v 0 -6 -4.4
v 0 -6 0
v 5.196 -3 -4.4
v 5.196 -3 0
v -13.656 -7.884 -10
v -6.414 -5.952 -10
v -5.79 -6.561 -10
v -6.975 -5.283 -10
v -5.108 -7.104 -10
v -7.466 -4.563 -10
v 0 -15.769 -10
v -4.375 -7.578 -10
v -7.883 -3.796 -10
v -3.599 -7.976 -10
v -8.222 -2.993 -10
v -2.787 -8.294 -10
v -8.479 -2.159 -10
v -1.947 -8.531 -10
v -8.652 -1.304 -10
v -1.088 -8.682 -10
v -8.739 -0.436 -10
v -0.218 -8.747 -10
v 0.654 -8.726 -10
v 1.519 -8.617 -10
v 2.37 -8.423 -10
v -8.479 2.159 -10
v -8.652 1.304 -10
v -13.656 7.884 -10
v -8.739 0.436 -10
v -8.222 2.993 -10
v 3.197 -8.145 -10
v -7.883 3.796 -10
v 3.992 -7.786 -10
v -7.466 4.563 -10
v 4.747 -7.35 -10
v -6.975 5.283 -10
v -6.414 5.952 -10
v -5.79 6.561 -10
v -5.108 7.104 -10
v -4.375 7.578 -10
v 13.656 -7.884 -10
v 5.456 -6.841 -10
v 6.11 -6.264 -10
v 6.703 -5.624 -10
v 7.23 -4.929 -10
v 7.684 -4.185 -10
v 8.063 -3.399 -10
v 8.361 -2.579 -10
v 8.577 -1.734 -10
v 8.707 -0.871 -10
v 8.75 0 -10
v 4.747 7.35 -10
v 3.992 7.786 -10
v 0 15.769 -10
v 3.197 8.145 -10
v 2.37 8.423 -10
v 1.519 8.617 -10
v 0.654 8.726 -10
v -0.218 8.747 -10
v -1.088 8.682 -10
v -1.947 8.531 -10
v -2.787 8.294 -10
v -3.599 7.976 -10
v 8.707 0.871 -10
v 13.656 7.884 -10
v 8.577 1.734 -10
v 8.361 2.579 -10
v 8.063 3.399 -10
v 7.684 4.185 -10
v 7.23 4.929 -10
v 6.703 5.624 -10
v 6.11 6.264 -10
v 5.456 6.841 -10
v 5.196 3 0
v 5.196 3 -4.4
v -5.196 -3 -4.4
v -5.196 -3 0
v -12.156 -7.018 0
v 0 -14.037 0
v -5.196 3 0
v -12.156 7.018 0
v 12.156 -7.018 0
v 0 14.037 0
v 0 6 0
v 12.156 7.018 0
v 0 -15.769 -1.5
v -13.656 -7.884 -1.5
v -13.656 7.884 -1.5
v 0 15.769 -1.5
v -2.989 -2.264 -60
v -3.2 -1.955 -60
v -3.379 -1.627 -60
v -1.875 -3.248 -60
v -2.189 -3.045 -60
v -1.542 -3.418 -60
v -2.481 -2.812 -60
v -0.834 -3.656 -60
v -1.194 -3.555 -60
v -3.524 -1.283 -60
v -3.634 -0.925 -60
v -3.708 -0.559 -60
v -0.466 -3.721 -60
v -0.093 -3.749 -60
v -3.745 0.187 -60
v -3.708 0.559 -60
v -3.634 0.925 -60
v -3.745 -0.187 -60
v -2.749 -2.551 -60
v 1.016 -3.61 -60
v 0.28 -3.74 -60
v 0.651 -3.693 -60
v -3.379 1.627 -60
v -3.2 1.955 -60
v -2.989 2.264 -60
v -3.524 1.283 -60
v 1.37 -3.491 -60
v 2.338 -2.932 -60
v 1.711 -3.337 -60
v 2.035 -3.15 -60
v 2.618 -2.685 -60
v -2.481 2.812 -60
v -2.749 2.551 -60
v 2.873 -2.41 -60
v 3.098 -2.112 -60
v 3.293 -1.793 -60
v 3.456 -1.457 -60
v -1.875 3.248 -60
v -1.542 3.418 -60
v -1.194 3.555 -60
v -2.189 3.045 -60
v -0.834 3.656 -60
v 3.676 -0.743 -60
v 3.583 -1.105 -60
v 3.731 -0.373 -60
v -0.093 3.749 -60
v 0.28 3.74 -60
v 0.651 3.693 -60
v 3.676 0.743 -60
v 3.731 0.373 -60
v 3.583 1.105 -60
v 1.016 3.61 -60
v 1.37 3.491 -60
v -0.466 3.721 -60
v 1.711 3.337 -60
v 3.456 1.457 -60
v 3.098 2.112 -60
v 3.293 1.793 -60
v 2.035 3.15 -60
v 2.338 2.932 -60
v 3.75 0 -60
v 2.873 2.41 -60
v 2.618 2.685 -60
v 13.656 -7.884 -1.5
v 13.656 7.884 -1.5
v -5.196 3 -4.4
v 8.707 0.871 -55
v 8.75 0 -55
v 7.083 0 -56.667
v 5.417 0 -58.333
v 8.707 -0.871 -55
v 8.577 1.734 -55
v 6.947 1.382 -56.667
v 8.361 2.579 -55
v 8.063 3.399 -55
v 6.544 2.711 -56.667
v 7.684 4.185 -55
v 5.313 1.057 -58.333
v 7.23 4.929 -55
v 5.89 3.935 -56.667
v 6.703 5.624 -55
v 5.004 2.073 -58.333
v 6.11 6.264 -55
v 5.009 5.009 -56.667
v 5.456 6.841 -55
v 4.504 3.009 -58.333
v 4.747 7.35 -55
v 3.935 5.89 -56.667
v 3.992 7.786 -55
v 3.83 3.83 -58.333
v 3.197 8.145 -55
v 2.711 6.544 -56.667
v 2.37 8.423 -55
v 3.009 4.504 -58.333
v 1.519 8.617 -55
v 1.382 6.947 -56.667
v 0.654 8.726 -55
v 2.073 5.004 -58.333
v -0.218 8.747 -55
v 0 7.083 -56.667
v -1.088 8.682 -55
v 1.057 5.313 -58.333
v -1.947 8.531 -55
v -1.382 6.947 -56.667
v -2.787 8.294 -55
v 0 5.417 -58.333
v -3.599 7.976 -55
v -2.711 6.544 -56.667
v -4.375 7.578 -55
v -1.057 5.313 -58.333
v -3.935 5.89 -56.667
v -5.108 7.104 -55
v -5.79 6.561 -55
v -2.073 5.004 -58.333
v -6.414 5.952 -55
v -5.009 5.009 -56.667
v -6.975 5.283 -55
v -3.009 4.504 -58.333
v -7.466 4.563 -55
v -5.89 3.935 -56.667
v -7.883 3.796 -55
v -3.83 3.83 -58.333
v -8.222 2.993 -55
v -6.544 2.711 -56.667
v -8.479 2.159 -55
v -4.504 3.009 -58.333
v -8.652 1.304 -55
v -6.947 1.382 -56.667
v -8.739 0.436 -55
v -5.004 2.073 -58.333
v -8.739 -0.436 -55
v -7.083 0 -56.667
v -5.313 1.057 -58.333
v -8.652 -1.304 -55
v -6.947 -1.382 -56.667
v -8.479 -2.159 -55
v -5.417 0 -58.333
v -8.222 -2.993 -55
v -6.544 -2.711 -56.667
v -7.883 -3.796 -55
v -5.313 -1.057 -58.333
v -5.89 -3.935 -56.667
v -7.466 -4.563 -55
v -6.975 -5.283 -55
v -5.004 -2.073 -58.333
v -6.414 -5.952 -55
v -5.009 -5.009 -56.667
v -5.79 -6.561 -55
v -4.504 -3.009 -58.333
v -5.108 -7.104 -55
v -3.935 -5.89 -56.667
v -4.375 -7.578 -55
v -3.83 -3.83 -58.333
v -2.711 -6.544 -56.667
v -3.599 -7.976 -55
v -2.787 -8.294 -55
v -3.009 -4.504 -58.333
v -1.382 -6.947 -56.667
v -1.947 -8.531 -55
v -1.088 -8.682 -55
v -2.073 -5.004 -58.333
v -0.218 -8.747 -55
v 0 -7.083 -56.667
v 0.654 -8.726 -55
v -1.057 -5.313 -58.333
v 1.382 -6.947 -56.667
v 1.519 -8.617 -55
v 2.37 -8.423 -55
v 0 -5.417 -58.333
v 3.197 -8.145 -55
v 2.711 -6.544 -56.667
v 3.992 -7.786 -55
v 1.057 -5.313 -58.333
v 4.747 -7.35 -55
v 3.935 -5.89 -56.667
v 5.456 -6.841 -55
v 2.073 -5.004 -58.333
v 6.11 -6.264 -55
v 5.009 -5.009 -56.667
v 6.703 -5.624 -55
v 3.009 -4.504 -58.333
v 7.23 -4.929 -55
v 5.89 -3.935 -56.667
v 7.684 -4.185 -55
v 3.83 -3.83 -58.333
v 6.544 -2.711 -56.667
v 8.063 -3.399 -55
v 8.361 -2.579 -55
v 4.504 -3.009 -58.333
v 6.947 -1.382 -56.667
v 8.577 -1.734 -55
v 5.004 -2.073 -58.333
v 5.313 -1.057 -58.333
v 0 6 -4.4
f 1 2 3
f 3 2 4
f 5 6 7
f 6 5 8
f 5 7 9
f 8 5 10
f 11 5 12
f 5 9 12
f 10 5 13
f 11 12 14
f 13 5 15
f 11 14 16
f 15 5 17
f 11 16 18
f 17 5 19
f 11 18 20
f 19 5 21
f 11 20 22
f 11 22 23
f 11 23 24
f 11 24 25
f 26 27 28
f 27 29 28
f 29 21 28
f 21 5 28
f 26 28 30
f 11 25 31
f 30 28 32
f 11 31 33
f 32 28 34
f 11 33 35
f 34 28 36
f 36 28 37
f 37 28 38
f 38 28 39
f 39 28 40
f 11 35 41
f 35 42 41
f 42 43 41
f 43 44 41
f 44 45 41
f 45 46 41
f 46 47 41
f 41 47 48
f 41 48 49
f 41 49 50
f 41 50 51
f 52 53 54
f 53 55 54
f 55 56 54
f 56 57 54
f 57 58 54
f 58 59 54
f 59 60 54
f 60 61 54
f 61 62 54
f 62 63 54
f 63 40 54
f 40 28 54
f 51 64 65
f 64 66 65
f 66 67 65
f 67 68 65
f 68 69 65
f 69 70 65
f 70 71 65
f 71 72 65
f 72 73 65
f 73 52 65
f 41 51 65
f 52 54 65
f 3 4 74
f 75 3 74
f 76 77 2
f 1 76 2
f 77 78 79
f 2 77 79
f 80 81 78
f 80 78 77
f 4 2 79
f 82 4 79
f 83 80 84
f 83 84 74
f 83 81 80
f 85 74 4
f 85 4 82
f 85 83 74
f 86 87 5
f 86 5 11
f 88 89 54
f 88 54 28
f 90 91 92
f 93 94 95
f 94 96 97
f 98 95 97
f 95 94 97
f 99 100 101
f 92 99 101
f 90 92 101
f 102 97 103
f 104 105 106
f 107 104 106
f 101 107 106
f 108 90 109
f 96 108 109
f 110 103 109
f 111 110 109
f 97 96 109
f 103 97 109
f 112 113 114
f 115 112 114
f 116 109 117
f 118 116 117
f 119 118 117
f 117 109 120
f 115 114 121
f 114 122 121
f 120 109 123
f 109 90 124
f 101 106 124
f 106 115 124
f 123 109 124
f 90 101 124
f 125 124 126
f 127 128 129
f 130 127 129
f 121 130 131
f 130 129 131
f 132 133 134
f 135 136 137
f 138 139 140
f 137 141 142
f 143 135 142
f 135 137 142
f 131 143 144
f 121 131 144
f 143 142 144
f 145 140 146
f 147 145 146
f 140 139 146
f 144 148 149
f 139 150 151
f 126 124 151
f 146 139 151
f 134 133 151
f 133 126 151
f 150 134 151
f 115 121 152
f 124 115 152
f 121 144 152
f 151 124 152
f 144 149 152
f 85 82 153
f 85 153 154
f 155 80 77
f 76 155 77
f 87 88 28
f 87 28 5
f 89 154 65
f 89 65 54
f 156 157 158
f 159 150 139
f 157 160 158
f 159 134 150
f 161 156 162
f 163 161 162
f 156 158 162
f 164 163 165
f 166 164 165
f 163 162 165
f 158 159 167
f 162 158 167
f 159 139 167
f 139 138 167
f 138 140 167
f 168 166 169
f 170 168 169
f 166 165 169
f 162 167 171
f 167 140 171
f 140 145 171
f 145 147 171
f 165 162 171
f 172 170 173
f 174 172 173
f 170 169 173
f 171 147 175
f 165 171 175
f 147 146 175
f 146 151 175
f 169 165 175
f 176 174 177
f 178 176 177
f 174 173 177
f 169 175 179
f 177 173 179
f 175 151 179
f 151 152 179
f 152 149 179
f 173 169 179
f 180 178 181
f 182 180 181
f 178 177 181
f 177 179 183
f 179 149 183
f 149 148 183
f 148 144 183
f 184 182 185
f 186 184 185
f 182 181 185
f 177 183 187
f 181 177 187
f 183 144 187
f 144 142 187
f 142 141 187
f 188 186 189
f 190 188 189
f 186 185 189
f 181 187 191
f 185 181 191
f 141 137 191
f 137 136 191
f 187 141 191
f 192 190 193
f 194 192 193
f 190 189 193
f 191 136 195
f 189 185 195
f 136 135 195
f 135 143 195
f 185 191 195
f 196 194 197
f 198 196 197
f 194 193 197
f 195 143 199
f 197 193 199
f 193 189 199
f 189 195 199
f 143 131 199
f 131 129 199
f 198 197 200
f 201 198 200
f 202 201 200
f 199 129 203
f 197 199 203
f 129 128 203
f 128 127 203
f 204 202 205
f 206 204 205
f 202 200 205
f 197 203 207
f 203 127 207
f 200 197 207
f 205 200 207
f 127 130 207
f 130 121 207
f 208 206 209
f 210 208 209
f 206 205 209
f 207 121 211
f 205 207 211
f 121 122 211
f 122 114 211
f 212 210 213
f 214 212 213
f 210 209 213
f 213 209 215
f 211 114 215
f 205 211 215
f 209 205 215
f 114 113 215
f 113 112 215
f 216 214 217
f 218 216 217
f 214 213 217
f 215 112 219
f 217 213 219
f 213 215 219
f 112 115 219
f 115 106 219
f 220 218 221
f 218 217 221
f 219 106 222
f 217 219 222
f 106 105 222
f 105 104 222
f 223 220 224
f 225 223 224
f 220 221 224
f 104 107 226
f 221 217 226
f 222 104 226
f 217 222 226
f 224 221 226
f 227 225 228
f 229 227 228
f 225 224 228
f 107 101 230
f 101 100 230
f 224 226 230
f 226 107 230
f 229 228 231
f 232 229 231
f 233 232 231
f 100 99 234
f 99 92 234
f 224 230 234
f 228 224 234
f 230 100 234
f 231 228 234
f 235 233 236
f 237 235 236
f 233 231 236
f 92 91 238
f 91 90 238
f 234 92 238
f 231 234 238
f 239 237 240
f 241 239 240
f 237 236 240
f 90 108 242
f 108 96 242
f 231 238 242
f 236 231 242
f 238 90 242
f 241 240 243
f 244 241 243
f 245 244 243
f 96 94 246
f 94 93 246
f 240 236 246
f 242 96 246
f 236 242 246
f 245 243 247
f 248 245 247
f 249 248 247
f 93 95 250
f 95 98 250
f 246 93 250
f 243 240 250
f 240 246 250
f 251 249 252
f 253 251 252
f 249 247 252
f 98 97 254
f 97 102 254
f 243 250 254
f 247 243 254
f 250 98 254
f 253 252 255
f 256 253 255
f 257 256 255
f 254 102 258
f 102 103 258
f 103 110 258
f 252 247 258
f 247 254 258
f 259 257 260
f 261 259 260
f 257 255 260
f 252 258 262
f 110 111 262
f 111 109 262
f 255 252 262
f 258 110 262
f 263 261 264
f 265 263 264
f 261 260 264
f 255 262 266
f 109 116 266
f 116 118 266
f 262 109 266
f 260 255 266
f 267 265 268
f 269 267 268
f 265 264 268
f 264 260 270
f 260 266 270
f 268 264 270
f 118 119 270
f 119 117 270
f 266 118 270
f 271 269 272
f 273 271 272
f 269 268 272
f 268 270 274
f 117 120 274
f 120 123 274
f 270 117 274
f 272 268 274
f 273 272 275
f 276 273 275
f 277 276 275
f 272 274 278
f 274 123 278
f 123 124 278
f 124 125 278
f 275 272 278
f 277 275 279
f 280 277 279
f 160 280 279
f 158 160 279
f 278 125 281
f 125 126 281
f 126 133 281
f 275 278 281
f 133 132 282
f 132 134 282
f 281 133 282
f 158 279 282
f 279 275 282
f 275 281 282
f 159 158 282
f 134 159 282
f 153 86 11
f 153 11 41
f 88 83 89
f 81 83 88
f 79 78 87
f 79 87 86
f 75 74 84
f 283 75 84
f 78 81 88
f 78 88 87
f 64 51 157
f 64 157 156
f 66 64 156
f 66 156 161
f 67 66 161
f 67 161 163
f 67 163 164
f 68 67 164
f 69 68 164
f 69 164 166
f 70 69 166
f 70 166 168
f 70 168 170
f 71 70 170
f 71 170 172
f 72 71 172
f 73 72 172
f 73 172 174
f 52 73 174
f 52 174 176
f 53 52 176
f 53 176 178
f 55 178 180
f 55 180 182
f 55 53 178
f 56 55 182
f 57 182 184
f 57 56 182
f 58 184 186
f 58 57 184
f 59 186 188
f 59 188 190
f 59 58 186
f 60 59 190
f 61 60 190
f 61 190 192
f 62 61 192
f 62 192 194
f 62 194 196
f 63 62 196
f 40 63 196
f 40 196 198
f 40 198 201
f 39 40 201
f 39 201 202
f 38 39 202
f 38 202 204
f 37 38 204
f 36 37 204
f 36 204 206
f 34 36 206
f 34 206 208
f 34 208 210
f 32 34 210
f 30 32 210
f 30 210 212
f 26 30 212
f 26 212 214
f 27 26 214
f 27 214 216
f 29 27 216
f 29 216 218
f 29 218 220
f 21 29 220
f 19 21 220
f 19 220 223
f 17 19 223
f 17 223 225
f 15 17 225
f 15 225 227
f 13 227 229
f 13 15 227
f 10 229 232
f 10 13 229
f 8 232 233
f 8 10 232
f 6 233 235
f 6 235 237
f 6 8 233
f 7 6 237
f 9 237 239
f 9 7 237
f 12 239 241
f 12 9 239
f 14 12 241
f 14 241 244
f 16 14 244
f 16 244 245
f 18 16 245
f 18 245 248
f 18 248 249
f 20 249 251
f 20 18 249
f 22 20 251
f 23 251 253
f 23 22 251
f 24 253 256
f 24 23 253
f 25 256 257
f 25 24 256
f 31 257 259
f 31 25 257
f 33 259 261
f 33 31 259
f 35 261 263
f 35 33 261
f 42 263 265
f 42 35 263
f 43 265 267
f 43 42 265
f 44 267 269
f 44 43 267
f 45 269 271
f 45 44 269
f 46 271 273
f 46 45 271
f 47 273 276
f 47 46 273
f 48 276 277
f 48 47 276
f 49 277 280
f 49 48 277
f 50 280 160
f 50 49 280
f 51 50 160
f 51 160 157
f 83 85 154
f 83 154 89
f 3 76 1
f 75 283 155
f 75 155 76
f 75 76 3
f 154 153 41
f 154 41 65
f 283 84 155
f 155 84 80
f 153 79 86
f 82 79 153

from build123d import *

# Parameters (mm, degrees)
F0_R     = 8.75
F1_DEPTH = 60
F2_DEPTH = 10
F3_SIZE  = 5
F5_DEPTH = 4.4
F6_SIZE  = 1.5


with BuildPart() as f1:
    # F0 (on Top) → F1 (new body)
    with BuildSketch(Plane.XY):
        Circle(F0_R)
    extrude(amount=-F1_DEPTH)

    # F0 (on Top) → F2 (join)
    with BuildSketch(Plane.XY):
        Polygon((13.656054, -7.884326), (13.656054, 7.884326), (0, 15.768653), (-13.656054, 7.884326), (-13.656054, -7.884326), (0, -15.768653), align=None)
        Circle(F0_R, mode=Mode.SUBTRACT)
        Circle(F0_R)
    extrude(amount=-F2_DEPTH)

    # F3
    f3_edges = [f1.edges().sort_by_distance(p)[0] for p in [
        (-8.75, 0, -60),
    ]]
    chamfer(f3_edges, length=F3_SIZE)

    # F4 (on face) → F5 (cut)
    with BuildSketch(Plane.XY):
        Polygon((5.196152, -3), (5.196152, 3), (0, 6), (-5.196152, 3), (-5.196152, -3), (0, -6), align=None)
    extrude(amount=-F5_DEPTH, mode=Mode.SUBTRACT)

    # F6
    f6_edges = [f1.edges().sort_by_distance(p)[0] for p in [
        (-6.828027, -11.826489, 0),
        (6.828027, -11.826489, 0),
        (13.656054, 0, 0),
        (6.828027, 11.826489, 0),
        (-6.828027, 11.826489, 0),
        (-13.656054, 0, 0),
    ]]
    chamfer(f6_edges, length=F6_SIZE)


solid = f1.part
